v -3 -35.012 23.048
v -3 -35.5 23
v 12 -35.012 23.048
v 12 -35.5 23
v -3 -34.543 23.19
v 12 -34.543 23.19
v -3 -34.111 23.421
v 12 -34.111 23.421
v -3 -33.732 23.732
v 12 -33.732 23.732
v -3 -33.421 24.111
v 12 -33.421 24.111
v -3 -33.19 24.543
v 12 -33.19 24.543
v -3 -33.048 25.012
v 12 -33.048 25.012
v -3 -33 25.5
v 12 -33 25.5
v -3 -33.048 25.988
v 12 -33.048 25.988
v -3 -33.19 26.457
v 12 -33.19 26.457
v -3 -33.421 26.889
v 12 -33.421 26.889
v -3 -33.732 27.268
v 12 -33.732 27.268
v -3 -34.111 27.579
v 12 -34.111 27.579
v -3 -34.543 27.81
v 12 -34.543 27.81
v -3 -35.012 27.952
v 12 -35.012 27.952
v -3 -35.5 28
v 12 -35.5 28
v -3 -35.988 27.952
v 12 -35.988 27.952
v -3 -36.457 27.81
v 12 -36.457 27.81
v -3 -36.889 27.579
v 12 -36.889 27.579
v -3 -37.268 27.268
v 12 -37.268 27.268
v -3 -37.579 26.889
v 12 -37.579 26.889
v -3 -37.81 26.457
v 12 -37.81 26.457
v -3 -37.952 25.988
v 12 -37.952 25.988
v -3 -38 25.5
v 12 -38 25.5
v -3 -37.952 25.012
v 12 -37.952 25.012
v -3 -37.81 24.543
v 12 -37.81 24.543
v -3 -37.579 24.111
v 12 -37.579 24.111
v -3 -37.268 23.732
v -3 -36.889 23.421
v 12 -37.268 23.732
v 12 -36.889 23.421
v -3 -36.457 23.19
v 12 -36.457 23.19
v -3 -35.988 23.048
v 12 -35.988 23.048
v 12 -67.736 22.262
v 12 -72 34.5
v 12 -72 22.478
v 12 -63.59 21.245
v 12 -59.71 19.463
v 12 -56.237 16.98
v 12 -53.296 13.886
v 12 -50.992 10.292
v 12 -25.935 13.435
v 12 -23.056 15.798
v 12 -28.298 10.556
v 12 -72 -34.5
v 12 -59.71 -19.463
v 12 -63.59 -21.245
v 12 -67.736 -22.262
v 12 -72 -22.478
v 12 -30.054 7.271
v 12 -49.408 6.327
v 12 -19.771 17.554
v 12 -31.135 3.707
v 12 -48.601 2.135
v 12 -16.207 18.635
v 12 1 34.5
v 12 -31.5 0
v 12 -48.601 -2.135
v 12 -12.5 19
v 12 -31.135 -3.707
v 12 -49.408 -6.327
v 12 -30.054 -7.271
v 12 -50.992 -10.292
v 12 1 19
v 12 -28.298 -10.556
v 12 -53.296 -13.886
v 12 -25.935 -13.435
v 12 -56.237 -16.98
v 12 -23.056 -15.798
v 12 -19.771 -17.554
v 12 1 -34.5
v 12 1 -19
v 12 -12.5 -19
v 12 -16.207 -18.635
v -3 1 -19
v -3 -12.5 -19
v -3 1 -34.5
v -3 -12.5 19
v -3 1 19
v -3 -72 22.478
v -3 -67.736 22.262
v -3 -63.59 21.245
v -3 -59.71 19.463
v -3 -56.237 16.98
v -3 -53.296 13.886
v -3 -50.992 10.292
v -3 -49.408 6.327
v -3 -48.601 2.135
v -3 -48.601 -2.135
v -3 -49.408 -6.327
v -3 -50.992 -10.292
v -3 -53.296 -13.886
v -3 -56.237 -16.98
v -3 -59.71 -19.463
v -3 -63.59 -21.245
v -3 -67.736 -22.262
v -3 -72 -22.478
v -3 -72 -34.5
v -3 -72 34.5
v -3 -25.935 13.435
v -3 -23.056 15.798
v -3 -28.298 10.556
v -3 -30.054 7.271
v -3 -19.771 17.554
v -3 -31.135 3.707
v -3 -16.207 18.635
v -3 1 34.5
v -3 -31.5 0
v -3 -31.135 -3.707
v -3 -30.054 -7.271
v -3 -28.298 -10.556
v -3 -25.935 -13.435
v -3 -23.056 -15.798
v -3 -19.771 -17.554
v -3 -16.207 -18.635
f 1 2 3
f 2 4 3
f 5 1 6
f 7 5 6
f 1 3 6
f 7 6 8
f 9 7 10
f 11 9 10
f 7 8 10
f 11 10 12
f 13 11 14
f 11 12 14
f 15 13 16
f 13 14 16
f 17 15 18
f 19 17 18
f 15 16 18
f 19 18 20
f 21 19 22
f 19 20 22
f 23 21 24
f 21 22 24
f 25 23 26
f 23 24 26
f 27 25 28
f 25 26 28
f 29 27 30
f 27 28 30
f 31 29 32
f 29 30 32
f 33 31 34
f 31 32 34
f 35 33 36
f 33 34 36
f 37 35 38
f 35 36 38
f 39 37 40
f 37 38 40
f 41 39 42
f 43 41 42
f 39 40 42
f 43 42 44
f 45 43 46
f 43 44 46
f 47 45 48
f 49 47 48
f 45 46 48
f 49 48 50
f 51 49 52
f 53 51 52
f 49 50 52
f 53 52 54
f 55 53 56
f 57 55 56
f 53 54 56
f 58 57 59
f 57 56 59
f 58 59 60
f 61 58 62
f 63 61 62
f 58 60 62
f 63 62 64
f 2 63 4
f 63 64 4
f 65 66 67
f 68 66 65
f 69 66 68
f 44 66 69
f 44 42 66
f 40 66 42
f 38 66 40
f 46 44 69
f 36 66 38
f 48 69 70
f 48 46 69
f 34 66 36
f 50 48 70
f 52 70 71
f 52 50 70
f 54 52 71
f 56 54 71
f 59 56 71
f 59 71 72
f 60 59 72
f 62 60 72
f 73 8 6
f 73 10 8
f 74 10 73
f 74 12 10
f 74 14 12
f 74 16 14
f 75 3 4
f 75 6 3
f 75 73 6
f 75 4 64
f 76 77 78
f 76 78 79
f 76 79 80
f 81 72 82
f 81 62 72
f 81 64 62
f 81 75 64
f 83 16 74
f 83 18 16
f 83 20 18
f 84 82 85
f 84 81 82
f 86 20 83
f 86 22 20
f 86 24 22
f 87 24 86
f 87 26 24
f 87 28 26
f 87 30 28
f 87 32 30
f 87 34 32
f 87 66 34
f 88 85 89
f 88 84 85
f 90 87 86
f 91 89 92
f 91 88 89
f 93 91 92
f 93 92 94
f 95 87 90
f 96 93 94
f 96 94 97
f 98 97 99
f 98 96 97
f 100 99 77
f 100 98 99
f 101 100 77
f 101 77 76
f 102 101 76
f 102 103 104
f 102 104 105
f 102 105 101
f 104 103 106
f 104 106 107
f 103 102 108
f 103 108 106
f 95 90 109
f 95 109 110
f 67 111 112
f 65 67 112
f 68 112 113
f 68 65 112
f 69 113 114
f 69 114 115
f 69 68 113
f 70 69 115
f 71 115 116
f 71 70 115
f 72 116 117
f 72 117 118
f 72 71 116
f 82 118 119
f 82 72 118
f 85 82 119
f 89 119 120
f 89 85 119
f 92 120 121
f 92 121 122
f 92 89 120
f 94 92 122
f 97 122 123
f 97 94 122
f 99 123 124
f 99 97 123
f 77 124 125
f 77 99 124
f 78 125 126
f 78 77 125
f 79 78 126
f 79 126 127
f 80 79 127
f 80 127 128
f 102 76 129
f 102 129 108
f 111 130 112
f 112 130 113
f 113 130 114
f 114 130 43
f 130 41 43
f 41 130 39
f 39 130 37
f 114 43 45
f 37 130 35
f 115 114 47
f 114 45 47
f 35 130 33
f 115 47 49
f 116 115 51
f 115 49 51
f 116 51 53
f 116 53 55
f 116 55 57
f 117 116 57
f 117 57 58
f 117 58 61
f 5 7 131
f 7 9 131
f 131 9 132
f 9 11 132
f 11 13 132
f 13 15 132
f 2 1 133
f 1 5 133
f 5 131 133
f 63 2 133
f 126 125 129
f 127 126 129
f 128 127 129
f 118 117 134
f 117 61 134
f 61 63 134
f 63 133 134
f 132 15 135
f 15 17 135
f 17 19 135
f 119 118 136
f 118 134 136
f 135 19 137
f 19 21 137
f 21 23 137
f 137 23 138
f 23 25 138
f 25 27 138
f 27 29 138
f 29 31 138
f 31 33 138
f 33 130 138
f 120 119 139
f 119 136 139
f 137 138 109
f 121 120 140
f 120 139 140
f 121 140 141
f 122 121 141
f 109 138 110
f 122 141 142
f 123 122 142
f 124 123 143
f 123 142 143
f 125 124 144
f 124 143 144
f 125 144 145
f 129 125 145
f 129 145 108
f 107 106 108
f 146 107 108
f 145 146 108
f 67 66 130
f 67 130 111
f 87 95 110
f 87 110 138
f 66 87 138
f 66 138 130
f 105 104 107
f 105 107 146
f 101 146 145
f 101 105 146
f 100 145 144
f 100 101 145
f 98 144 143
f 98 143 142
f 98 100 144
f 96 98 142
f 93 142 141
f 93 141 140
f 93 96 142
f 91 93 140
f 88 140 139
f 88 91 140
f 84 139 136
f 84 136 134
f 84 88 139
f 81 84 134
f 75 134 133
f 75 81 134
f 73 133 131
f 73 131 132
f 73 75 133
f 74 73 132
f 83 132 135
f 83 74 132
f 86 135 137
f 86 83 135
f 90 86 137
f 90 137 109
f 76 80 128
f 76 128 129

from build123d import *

# Parameters (mm, degrees)
BOSS_EXTRUDE1_DEPTH = 12
CUT_EXTRUDE1_DEPTH  = 80.418196907
SKETCH7_R           = 2.5
CUT_EXTRUDE2_DEPTH  = 80.418196907
SKETCH8_R           = 2.5
BOSS_EXTRUDE2_DEPTH = 15


with BuildPart() as part:
    # Sketch1 → Boss-Extrude1 (new body)
    with BuildSketch(Plane(origin=(0, 0, 0), x_dir=(0, 0, -1), z_dir=(1, 0, 0))):
        with BuildLine():
            Line((-33.5, 0), (33.5, 0))
            Line((33.5, 0), (33.5, -71))
            Line((33.5, -71), (23.5, -71))
            ThreePointArc((23.5, -71), (0, -47.5), (-23.5, -71))
            Line((-23.5, -71), (-33.5, -71))
            Line((-33.5, -71), (-33.5, 0))
        make_face()
    extrude(amount=BOSS_EXTRUDE1_DEPTH)

    # Sketch6 → Cut-Extrude1 (cut, through all)
    with BuildSketch(Plane(origin=(12, 0, 0), x_dir=(0, 0, -1), z_dir=(1, 0, 0))):
        with BuildLine():
            Line((20, 12.5), (20, -12.5))
            ThreePointArc((20, -12.5), (0, -32.5), (-20, -12.5))
            Line((-20, -12.5), (-20, 12.5))
            ThreePointArc((-20, 12.5), (0, 32.5), (20, 12.5))
        make_face()
    extrude(amount=-CUT_EXTRUDE1_DEPTH, mode=Mode.SUBTRACT)

    # Sketch7 → Cut-Extrude2 (cut, through all)
    with BuildSketch(Plane(origin=(12, 0, 0), x_dir=(0, 0, -1), z_dir=(1, 0, 0))):
        with Locations((-25.5, -35.5)):
            Circle(SKETCH7_R)
    extrude(amount=-CUT_EXTRUDE2_DEPTH, mode=Mode.SUBTRACT)

    # Sketch8 → Boss-Extrude2 (add)
    with BuildSketch(Plane(origin=(12, 0, 0), x_dir=(0, 0, -1), z_dir=(1, 0, 0))):
        with BuildLine():
            Line((-19, 1), (-34.5, 1))
            Line((-34.5, 1), (-34.5, -72))
            Line((-34.5, -72), (-22.477766793, -72))
            ThreePointArc((-22.477766793, -72), (0, -48.5), (22.477766793, -72))
            Line((22.477766793, -72), (34.5, -72))
            Line((34.5, -72), (34.5, 1))
            Line((34.5, 1), (19, 1))
            Line((19, 1), (19, -12.5))
            ThreePointArc((19, -12.5), (0, -31.5), (-19, -12.5))
            Line((-19, -12.5), (-19, 1))
        make_face()
        with Locations((-25.5, -35.5)):
            Circle(SKETCH8_R, mode=Mode.SUBTRACT)
    extrude(amount=-BOSS_EXTRUDE2_DEPTH)


solid = part.part
